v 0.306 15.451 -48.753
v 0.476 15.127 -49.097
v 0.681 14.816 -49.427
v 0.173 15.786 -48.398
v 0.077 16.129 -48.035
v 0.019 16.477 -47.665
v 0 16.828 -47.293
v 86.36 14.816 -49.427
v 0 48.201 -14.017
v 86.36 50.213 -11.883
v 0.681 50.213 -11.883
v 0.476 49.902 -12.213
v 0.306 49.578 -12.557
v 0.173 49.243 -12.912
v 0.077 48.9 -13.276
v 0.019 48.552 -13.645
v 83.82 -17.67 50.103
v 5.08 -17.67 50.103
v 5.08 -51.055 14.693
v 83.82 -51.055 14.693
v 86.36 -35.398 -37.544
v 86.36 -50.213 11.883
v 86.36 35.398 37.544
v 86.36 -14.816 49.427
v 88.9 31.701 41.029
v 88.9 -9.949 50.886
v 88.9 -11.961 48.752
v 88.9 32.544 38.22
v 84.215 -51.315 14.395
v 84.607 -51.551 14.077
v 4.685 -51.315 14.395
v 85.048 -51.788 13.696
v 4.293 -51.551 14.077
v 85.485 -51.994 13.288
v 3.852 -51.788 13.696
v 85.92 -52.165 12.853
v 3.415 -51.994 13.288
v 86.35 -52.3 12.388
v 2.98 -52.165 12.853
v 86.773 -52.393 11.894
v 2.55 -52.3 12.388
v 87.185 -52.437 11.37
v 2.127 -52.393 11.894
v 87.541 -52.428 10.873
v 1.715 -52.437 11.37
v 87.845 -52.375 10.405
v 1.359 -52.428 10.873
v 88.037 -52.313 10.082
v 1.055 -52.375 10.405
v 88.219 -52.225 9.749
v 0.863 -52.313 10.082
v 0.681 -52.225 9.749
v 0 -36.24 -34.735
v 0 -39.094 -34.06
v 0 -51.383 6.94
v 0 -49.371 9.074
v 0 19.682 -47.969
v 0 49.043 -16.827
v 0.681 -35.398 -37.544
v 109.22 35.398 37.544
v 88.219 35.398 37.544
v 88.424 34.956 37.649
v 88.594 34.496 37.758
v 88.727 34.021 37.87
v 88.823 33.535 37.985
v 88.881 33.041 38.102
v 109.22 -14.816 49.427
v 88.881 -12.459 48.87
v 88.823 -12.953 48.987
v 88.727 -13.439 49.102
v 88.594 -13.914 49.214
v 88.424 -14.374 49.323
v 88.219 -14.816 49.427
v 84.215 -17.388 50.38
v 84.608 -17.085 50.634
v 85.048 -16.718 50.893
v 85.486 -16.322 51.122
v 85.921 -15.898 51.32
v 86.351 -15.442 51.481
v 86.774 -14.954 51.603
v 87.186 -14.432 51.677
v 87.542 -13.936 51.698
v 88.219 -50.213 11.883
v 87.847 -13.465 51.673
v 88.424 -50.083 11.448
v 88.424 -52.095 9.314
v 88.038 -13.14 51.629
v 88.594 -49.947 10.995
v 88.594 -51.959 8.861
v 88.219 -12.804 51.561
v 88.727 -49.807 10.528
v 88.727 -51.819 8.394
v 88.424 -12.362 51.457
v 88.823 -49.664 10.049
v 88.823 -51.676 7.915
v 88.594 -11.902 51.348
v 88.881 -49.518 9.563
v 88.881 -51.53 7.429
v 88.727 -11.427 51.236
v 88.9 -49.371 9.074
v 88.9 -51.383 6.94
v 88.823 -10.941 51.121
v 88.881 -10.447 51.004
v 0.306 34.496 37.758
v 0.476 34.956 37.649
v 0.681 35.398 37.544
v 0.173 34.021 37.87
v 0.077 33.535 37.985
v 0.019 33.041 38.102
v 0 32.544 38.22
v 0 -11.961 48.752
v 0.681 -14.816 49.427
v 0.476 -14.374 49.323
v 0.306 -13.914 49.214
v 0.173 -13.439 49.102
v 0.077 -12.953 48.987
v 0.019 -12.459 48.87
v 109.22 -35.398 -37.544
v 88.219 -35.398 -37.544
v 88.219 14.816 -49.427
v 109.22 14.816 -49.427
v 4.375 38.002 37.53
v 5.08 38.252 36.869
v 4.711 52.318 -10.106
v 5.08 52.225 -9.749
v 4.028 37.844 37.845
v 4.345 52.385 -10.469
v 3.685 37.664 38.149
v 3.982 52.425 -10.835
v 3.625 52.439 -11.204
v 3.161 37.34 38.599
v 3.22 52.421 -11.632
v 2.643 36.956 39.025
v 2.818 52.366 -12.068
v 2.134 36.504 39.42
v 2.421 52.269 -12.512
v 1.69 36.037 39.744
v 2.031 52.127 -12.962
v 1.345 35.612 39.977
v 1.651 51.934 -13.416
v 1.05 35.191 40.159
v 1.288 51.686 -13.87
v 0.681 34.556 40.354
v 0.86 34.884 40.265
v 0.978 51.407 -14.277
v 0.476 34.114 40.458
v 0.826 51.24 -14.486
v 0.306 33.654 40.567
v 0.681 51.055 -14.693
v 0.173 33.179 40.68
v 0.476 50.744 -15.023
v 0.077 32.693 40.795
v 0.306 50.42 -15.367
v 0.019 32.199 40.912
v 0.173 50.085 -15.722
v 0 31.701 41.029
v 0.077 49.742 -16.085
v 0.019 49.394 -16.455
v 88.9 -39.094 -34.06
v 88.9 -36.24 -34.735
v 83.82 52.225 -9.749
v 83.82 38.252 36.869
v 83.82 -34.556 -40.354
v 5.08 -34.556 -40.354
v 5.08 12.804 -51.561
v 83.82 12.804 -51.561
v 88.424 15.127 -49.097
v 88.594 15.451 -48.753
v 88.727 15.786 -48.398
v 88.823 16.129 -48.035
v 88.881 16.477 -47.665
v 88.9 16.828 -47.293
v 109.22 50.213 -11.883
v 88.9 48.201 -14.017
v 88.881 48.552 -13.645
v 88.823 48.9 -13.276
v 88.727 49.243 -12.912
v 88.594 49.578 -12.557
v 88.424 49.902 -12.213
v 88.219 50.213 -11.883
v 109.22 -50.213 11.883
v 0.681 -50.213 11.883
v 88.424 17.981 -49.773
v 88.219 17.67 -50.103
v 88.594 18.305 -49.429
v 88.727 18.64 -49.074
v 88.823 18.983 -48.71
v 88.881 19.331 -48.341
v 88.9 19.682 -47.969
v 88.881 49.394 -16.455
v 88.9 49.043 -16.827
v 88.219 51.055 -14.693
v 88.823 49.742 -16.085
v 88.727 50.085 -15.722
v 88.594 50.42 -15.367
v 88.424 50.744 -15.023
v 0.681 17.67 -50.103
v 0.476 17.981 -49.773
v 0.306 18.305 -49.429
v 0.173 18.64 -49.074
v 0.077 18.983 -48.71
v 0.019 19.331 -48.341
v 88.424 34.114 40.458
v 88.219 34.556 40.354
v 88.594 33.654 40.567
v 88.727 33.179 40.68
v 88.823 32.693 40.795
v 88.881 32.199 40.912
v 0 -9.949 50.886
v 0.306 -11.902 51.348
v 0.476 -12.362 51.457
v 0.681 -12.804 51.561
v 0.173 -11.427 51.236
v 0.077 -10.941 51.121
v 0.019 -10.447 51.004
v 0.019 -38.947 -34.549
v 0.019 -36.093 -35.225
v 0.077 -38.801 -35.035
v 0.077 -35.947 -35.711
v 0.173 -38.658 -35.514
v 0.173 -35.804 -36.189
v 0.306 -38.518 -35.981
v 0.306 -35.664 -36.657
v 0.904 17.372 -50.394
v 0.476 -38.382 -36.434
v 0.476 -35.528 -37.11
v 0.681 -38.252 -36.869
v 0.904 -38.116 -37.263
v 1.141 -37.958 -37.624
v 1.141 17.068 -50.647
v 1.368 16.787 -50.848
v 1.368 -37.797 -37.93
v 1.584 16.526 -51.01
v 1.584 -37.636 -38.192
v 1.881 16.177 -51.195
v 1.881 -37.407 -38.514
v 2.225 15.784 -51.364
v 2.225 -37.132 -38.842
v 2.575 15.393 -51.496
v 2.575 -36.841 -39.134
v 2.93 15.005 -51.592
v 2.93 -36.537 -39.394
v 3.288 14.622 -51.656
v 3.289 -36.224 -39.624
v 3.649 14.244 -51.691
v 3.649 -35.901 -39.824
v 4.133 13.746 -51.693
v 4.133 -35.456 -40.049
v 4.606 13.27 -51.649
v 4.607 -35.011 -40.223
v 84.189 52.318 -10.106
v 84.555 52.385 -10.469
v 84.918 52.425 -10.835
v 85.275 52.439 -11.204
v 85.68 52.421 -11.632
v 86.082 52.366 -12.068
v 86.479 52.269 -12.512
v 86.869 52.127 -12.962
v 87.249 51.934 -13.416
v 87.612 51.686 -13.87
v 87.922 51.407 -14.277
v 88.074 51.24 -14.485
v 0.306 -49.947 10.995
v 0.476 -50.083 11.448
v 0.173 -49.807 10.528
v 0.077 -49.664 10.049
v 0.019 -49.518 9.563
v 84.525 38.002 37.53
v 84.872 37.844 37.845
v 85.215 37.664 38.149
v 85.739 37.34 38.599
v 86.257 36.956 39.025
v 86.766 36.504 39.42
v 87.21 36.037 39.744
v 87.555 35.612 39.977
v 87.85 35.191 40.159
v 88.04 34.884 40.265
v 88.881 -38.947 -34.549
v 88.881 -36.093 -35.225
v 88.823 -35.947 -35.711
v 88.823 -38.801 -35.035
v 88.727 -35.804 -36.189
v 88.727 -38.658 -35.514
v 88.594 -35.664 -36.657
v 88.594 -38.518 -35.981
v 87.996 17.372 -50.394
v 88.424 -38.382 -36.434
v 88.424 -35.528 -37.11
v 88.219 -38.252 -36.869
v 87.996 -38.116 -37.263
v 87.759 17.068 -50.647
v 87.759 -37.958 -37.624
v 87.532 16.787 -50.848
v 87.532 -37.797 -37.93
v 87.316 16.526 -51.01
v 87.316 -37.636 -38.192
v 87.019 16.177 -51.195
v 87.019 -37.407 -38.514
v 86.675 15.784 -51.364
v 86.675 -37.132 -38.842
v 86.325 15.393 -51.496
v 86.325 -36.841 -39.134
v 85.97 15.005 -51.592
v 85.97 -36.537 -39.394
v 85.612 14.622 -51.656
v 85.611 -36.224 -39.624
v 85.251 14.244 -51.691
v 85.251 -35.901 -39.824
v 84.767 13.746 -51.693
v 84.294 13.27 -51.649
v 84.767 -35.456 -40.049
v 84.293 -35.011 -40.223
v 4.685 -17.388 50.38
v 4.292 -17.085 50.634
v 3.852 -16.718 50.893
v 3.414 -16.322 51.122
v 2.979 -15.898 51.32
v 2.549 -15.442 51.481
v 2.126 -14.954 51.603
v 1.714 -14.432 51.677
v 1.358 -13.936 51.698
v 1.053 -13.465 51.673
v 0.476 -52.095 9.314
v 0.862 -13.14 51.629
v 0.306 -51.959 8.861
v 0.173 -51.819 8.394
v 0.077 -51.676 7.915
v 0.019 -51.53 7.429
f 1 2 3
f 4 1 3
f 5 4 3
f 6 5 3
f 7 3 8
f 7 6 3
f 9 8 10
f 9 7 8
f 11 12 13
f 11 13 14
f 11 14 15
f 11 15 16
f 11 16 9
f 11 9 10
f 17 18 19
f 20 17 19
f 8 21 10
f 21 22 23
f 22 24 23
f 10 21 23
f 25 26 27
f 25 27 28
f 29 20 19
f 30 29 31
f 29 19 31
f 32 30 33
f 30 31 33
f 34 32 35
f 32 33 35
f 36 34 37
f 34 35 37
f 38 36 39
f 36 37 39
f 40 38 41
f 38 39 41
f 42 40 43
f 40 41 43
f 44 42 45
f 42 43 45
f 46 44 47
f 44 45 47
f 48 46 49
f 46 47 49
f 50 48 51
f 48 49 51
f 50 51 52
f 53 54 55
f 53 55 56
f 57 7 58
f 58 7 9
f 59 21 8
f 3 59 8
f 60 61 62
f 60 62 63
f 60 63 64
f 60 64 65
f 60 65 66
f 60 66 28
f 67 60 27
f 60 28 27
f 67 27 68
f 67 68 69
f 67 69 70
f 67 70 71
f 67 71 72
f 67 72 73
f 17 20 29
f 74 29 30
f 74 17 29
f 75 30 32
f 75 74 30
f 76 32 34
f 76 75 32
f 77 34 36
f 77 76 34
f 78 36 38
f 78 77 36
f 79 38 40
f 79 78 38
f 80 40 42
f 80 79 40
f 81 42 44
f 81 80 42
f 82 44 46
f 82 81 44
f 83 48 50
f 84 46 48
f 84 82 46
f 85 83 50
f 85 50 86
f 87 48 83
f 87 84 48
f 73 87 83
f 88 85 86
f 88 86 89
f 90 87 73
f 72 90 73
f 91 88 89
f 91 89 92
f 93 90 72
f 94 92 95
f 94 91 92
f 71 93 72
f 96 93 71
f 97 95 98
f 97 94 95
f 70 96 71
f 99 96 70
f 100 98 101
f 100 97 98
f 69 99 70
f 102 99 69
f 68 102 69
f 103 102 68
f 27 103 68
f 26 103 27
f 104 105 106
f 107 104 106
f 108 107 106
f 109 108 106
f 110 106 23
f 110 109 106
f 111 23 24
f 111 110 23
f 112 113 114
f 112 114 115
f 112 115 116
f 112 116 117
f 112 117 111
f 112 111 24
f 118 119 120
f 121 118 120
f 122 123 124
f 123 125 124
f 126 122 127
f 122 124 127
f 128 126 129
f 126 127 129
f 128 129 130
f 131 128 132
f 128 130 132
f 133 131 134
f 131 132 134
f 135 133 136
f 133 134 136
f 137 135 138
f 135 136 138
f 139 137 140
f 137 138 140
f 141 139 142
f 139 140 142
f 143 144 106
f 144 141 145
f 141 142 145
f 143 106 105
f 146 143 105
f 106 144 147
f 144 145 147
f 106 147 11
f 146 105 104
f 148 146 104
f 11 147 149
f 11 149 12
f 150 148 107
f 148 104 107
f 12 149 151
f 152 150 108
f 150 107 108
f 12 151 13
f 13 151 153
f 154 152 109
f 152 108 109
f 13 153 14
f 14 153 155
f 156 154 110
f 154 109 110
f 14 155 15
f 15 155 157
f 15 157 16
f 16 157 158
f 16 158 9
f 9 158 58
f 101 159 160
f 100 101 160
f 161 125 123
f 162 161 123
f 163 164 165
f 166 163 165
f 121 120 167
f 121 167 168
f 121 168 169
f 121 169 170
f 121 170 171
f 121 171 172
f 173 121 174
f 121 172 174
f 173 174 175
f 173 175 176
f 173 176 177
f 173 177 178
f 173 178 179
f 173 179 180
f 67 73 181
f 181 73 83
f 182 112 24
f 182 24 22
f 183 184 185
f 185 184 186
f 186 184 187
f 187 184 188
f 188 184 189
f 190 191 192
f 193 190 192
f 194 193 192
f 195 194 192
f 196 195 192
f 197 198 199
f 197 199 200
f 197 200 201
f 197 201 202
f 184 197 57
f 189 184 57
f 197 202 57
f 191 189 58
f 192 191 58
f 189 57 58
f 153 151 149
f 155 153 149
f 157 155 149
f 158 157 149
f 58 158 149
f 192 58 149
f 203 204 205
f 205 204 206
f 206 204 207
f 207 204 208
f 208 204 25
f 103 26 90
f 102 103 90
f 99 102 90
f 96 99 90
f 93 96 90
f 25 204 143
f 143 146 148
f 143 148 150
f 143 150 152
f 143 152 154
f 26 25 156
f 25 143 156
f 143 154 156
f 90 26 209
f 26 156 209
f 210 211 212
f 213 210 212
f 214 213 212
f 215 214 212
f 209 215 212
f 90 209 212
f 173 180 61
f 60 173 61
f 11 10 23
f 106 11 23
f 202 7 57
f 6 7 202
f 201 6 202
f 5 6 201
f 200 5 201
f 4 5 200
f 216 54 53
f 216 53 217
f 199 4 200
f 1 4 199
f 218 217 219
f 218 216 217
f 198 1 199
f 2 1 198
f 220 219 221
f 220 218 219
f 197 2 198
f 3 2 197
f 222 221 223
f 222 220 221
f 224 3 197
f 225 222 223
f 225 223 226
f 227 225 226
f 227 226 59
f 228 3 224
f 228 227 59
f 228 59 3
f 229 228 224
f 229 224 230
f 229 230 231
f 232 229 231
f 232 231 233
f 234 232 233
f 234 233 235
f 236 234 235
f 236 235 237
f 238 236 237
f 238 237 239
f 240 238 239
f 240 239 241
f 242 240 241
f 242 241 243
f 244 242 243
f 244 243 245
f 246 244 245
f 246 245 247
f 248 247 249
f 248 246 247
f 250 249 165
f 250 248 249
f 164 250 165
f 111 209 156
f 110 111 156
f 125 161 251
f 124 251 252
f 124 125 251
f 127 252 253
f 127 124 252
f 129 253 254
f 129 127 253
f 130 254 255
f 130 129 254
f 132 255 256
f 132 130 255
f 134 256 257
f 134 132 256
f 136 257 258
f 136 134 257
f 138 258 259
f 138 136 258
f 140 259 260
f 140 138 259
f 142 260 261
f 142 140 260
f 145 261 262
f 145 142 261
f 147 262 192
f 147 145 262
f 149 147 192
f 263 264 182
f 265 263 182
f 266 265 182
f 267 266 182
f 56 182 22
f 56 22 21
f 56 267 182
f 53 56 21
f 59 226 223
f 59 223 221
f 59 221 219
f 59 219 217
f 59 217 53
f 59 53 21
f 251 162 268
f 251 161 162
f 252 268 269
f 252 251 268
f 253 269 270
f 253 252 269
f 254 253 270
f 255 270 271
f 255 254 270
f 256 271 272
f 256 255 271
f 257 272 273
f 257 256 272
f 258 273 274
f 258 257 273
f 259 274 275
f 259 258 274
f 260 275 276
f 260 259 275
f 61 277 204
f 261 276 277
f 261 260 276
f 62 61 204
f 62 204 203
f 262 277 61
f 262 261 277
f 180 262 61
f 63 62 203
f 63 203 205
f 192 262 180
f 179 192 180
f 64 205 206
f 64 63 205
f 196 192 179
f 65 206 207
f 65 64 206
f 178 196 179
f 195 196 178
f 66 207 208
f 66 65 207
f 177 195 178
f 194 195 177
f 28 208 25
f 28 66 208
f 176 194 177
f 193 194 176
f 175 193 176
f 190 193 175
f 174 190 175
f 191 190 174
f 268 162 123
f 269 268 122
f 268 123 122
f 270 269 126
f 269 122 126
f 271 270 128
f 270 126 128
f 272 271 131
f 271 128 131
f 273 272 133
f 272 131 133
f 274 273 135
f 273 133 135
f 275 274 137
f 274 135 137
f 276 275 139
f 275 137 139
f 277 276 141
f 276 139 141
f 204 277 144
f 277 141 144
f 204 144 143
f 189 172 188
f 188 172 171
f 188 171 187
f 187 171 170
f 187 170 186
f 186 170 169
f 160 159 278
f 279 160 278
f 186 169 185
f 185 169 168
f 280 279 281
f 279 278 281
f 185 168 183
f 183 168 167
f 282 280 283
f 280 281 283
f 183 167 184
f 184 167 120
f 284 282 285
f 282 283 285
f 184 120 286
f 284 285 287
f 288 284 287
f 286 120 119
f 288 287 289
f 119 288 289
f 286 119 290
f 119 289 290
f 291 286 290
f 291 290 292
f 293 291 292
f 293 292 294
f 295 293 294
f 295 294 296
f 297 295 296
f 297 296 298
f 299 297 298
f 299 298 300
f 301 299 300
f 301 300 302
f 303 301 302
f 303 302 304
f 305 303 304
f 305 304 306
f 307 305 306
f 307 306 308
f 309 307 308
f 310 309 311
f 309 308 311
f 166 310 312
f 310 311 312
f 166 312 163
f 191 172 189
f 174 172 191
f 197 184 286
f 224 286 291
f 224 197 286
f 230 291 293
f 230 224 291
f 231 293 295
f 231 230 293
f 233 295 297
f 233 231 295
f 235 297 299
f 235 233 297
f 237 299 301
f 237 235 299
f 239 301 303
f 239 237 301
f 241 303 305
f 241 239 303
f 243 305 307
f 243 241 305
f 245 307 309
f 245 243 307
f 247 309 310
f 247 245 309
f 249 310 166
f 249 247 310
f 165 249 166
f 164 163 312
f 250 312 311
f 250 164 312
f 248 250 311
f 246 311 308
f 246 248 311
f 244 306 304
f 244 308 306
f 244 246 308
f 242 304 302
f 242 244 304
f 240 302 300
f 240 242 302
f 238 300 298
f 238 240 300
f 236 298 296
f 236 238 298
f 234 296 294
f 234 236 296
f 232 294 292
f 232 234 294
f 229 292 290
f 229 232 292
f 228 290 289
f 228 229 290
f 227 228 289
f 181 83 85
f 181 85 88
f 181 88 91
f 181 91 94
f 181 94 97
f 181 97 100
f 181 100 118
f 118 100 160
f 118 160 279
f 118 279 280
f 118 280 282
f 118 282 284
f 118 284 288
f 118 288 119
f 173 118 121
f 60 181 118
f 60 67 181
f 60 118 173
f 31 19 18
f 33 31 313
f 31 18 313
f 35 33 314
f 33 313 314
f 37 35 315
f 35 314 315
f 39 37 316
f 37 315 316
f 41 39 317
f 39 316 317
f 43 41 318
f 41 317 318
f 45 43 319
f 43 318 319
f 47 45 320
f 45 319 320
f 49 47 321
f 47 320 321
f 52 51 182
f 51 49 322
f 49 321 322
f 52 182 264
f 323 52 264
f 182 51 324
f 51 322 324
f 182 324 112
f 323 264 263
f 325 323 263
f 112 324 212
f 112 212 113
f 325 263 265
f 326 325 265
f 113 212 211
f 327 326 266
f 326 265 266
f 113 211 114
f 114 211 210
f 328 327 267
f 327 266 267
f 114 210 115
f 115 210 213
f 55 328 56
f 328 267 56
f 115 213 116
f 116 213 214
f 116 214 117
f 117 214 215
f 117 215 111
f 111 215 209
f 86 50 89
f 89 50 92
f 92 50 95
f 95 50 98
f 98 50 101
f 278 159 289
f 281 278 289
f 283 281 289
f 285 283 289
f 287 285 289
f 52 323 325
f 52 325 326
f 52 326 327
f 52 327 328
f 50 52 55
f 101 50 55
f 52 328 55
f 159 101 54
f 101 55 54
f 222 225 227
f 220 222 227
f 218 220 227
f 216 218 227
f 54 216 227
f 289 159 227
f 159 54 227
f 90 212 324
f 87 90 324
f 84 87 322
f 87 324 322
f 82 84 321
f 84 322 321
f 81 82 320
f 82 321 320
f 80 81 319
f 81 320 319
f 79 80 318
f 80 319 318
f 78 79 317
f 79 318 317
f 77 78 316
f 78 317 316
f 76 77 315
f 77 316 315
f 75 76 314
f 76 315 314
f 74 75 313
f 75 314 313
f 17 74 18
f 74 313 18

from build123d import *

# Parameters (mm, degrees)
F1_DEPTH    = 88.9
F2_T        = -2.54
F3_T1_DEPTH = 103.5646968374
F3_T3_DEPTH = 79.9330955154
F4_T1_DEPTH = 103.5646968374
F4_T3_DEPTH = 79.9330955154
F5_T1_DEPTH = 103.5646968374
F5_T3_DEPTH = 79.9330955154
F6_DEPTH    = 22.86


# Not quite as in the source:
# - a fillet or chamfer that OpenCascade refuses, or shapes differently, is made with other operations: its cross-section is extruded or revolved along the edge and cut away or added


with BuildPart() as f1:
    # F0 (on Right) → F1 (new body)
    with BuildSketch(Plane.YZ):
        Polygon((-15.657663601, 52.2369225457), (-53.0673337406, 12.5585268304), (-37.4096701396, -39.6783957152), (15.657663601, -52.2369225457), (53.0673337406, -12.5585268304), (37.4096701396, 39.6783957152), align=None)
    extrude(amount=F1_DEPTH)

    # F2
    f2_openings = [f1.faces().sort_by_distance(p)[0] for p in [
        (0, 0, 0),
    ]]
    offset(amount=F2_T, openings=f2_openings)

    # F3: fillet of radius 5.08 on 4 edges, made by hand

    # F3_s2 → F3_t1 (cut)
    with BuildSketch(Plane.YZ.offset(-7.3323484187)):
        with BuildLine():
            ThreePointArc((-12.8035569199, 51.5614905463), (-15.4320203518, 51.484134056), (-17.6696582116, 50.1029096544))
            Line((-17.6696582116, 50.1029096544), (-15.657663601, 52.2369225457))
            Line((-15.657663601, 52.2369225457), (-12.8035569199, 51.5614905463))
        make_face()
        with BuildLine():
            ThreePointArc((-51.05533913, 14.6925397217), (-52.3025781603, 12.3775453716), (-52.22522167, 9.7490819397))
            Line((-52.22522167, 9.7490819397), (-53.0673337406, 12.5585268304))
            Line((-53.0673337406, 12.5585268304), (-51.05533913, 14.6925397217))
        make_face()
    extrude(amount=F3_T1_DEPTH, mode=Mode.SUBTRACT)

    # F3_s4 → F3_t3 (cut)
    with BuildSketch(Plane(origin=(0, 27.4170272951, 29.0797447369), x_dir=(1, 0, 0), z_dir=(0, -0.6859993878, -0.7276021165))):
        with BuildLine():
            ThreePointArc((5.08, 47.2270460633), (1.4878975516, 45.7391485117), (0, 42.1470460633))
            Line((0, 42.1470460633), (0, 47.2270460633))
            Line((0, 47.2270460633), (5.08, 47.2270460633))
        make_face()
        with BuildLine():
            ThreePointArc((83.82, 47.2270460633), (87.4121024484, 45.7391485117), (88.9, 42.1470460633))
            Line((88.9, 42.1470460633), (88.9, 47.2270460633))
            Line((88.9, 47.2270460633), (83.82, 47.2270460633))
        make_face()
    extrude(amount=F3_T3_DEPTH, mode=Mode.SUBTRACT)

    # F4: fillet of radius 5.08 on 4 edges, made by hand

    # F4_s2 → F4_t1 (cut)
    with BuildSketch(Plane.YZ.offset(-7.3323484187)):
        with BuildLine():
            ThreePointArc((52.22522167, -9.7490819397), (52.3025781603, -12.3775453716), (51.05533913, -14.6925397217))
            Line((51.05533913, -14.6925397217), (53.0673337406, -12.5585268304))
            Line((53.0673337406, -12.5585268304), (52.22522167, -9.7490819397))
        make_face()
        with BuildLine():
            ThreePointArc((38.2517822101, 36.8689508245), (36.8705578085, 39.1065886844), (34.5555634584, 40.3538277147))
            Line((34.5555634584, 40.3538277147), (37.4096701396, 39.6783957152))
            Line((37.4096701396, 39.6783957152), (38.2517822101, 36.8689508245))
        make_face()
    extrude(amount=F4_T1_DEPTH, mode=Mode.SUBTRACT)

    # F4_s4 → F4_t3 (cut)
    with BuildSketch(Plane(origin=(0, 11.4752840302, -38.2837145023), x_dir=(1, 0, 0), z_dir=(0, -0.2871222228, 0.9578939551))):
        with BuildLine():
            ThreePointArc((5.08, 47.2270460633), (1.4878975516, 45.7391485117), (0, 42.1470460633))
            Line((0, 42.1470460633), (0, 47.2270460633))
            Line((0, 47.2270460633), (5.08, 47.2270460633))
        make_face()
        with BuildLine():
            ThreePointArc((83.82, 47.2270460633), (87.4121024484, 45.7391485117), (88.9, 42.1470460633))
            Line((88.9, 42.1470460633), (88.9, 47.2270460633))
            Line((88.9, 47.2270460633), (83.82, 47.2270460633))
        make_face()
    extrude(amount=F4_T3_DEPTH, mode=Mode.SUBTRACT)

    # F5: fillet of radius 5.08 on 4 edges, made by hand

    # F5_s2 → F5_t1 (cut)
    with BuildSketch(Plane.YZ.offset(-7.3323484187)):
        with BuildLine():
            ThreePointArc((-34.5555634584, -40.3538277147), (-36.8705578085, -39.1065886844), (-38.2517822101, -36.8689508245))
            Line((-38.2517822101, -36.8689508245), (-37.4096701396, -39.6783957152))
            Line((-37.4096701396, -39.6783957152), (-34.5555634584, -40.3538277147))
        make_face()
        with BuildLine():
            ThreePointArc((17.6696582116, -50.1029096544), (15.4320203518, -51.484134056), (12.8035569199, -51.5614905463))
            Line((12.8035569199, -51.5614905463), (15.657663601, -52.2369225457))
            Line((15.657663601, -52.2369225457), (17.6696582116, -50.1029096544))
        make_face()
    extrude(amount=F5_T1_DEPTH, mode=Mode.SUBTRACT)

    # F5_s4 → F5_t3 (cut)
    with BuildSketch(Plane(origin=(0, -38.8923113253, 9.2039697654), x_dir=(1, 0, 0), z_dir=(0, 0.9731216106, -0.2302918386))):
        with BuildLine():
            ThreePointArc((0, 42.1470460633), (1.4878975516, 45.7391485117), (5.08, 47.2270460633))
            Line((5.08, 47.2270460633), (0, 47.2270460633))
            Line((0, 47.2270460633), (0, 42.1470460633))
        make_face()
        with BuildLine():
            ThreePointArc((88.9, 42.1470460633), (87.4121024484, 45.7391485117), (83.82, 47.2270460633))
            Line((83.82, 47.2270460633), (88.9, 47.2270460633))
            Line((88.9, 47.2270460633), (88.9, 42.1470460633))
        make_face()
    extrude(amount=F5_T3_DEPTH, mode=Mode.SUBTRACT)

    # F6 (add): a face of the model
    f6_faces = [f1.faces().sort_by_distance(p)[0] for p in [
        (86.36, 0, 0),
    ]]
    extrude(f6_faces, amount=-F6_DEPTH)


solid = f1.part
